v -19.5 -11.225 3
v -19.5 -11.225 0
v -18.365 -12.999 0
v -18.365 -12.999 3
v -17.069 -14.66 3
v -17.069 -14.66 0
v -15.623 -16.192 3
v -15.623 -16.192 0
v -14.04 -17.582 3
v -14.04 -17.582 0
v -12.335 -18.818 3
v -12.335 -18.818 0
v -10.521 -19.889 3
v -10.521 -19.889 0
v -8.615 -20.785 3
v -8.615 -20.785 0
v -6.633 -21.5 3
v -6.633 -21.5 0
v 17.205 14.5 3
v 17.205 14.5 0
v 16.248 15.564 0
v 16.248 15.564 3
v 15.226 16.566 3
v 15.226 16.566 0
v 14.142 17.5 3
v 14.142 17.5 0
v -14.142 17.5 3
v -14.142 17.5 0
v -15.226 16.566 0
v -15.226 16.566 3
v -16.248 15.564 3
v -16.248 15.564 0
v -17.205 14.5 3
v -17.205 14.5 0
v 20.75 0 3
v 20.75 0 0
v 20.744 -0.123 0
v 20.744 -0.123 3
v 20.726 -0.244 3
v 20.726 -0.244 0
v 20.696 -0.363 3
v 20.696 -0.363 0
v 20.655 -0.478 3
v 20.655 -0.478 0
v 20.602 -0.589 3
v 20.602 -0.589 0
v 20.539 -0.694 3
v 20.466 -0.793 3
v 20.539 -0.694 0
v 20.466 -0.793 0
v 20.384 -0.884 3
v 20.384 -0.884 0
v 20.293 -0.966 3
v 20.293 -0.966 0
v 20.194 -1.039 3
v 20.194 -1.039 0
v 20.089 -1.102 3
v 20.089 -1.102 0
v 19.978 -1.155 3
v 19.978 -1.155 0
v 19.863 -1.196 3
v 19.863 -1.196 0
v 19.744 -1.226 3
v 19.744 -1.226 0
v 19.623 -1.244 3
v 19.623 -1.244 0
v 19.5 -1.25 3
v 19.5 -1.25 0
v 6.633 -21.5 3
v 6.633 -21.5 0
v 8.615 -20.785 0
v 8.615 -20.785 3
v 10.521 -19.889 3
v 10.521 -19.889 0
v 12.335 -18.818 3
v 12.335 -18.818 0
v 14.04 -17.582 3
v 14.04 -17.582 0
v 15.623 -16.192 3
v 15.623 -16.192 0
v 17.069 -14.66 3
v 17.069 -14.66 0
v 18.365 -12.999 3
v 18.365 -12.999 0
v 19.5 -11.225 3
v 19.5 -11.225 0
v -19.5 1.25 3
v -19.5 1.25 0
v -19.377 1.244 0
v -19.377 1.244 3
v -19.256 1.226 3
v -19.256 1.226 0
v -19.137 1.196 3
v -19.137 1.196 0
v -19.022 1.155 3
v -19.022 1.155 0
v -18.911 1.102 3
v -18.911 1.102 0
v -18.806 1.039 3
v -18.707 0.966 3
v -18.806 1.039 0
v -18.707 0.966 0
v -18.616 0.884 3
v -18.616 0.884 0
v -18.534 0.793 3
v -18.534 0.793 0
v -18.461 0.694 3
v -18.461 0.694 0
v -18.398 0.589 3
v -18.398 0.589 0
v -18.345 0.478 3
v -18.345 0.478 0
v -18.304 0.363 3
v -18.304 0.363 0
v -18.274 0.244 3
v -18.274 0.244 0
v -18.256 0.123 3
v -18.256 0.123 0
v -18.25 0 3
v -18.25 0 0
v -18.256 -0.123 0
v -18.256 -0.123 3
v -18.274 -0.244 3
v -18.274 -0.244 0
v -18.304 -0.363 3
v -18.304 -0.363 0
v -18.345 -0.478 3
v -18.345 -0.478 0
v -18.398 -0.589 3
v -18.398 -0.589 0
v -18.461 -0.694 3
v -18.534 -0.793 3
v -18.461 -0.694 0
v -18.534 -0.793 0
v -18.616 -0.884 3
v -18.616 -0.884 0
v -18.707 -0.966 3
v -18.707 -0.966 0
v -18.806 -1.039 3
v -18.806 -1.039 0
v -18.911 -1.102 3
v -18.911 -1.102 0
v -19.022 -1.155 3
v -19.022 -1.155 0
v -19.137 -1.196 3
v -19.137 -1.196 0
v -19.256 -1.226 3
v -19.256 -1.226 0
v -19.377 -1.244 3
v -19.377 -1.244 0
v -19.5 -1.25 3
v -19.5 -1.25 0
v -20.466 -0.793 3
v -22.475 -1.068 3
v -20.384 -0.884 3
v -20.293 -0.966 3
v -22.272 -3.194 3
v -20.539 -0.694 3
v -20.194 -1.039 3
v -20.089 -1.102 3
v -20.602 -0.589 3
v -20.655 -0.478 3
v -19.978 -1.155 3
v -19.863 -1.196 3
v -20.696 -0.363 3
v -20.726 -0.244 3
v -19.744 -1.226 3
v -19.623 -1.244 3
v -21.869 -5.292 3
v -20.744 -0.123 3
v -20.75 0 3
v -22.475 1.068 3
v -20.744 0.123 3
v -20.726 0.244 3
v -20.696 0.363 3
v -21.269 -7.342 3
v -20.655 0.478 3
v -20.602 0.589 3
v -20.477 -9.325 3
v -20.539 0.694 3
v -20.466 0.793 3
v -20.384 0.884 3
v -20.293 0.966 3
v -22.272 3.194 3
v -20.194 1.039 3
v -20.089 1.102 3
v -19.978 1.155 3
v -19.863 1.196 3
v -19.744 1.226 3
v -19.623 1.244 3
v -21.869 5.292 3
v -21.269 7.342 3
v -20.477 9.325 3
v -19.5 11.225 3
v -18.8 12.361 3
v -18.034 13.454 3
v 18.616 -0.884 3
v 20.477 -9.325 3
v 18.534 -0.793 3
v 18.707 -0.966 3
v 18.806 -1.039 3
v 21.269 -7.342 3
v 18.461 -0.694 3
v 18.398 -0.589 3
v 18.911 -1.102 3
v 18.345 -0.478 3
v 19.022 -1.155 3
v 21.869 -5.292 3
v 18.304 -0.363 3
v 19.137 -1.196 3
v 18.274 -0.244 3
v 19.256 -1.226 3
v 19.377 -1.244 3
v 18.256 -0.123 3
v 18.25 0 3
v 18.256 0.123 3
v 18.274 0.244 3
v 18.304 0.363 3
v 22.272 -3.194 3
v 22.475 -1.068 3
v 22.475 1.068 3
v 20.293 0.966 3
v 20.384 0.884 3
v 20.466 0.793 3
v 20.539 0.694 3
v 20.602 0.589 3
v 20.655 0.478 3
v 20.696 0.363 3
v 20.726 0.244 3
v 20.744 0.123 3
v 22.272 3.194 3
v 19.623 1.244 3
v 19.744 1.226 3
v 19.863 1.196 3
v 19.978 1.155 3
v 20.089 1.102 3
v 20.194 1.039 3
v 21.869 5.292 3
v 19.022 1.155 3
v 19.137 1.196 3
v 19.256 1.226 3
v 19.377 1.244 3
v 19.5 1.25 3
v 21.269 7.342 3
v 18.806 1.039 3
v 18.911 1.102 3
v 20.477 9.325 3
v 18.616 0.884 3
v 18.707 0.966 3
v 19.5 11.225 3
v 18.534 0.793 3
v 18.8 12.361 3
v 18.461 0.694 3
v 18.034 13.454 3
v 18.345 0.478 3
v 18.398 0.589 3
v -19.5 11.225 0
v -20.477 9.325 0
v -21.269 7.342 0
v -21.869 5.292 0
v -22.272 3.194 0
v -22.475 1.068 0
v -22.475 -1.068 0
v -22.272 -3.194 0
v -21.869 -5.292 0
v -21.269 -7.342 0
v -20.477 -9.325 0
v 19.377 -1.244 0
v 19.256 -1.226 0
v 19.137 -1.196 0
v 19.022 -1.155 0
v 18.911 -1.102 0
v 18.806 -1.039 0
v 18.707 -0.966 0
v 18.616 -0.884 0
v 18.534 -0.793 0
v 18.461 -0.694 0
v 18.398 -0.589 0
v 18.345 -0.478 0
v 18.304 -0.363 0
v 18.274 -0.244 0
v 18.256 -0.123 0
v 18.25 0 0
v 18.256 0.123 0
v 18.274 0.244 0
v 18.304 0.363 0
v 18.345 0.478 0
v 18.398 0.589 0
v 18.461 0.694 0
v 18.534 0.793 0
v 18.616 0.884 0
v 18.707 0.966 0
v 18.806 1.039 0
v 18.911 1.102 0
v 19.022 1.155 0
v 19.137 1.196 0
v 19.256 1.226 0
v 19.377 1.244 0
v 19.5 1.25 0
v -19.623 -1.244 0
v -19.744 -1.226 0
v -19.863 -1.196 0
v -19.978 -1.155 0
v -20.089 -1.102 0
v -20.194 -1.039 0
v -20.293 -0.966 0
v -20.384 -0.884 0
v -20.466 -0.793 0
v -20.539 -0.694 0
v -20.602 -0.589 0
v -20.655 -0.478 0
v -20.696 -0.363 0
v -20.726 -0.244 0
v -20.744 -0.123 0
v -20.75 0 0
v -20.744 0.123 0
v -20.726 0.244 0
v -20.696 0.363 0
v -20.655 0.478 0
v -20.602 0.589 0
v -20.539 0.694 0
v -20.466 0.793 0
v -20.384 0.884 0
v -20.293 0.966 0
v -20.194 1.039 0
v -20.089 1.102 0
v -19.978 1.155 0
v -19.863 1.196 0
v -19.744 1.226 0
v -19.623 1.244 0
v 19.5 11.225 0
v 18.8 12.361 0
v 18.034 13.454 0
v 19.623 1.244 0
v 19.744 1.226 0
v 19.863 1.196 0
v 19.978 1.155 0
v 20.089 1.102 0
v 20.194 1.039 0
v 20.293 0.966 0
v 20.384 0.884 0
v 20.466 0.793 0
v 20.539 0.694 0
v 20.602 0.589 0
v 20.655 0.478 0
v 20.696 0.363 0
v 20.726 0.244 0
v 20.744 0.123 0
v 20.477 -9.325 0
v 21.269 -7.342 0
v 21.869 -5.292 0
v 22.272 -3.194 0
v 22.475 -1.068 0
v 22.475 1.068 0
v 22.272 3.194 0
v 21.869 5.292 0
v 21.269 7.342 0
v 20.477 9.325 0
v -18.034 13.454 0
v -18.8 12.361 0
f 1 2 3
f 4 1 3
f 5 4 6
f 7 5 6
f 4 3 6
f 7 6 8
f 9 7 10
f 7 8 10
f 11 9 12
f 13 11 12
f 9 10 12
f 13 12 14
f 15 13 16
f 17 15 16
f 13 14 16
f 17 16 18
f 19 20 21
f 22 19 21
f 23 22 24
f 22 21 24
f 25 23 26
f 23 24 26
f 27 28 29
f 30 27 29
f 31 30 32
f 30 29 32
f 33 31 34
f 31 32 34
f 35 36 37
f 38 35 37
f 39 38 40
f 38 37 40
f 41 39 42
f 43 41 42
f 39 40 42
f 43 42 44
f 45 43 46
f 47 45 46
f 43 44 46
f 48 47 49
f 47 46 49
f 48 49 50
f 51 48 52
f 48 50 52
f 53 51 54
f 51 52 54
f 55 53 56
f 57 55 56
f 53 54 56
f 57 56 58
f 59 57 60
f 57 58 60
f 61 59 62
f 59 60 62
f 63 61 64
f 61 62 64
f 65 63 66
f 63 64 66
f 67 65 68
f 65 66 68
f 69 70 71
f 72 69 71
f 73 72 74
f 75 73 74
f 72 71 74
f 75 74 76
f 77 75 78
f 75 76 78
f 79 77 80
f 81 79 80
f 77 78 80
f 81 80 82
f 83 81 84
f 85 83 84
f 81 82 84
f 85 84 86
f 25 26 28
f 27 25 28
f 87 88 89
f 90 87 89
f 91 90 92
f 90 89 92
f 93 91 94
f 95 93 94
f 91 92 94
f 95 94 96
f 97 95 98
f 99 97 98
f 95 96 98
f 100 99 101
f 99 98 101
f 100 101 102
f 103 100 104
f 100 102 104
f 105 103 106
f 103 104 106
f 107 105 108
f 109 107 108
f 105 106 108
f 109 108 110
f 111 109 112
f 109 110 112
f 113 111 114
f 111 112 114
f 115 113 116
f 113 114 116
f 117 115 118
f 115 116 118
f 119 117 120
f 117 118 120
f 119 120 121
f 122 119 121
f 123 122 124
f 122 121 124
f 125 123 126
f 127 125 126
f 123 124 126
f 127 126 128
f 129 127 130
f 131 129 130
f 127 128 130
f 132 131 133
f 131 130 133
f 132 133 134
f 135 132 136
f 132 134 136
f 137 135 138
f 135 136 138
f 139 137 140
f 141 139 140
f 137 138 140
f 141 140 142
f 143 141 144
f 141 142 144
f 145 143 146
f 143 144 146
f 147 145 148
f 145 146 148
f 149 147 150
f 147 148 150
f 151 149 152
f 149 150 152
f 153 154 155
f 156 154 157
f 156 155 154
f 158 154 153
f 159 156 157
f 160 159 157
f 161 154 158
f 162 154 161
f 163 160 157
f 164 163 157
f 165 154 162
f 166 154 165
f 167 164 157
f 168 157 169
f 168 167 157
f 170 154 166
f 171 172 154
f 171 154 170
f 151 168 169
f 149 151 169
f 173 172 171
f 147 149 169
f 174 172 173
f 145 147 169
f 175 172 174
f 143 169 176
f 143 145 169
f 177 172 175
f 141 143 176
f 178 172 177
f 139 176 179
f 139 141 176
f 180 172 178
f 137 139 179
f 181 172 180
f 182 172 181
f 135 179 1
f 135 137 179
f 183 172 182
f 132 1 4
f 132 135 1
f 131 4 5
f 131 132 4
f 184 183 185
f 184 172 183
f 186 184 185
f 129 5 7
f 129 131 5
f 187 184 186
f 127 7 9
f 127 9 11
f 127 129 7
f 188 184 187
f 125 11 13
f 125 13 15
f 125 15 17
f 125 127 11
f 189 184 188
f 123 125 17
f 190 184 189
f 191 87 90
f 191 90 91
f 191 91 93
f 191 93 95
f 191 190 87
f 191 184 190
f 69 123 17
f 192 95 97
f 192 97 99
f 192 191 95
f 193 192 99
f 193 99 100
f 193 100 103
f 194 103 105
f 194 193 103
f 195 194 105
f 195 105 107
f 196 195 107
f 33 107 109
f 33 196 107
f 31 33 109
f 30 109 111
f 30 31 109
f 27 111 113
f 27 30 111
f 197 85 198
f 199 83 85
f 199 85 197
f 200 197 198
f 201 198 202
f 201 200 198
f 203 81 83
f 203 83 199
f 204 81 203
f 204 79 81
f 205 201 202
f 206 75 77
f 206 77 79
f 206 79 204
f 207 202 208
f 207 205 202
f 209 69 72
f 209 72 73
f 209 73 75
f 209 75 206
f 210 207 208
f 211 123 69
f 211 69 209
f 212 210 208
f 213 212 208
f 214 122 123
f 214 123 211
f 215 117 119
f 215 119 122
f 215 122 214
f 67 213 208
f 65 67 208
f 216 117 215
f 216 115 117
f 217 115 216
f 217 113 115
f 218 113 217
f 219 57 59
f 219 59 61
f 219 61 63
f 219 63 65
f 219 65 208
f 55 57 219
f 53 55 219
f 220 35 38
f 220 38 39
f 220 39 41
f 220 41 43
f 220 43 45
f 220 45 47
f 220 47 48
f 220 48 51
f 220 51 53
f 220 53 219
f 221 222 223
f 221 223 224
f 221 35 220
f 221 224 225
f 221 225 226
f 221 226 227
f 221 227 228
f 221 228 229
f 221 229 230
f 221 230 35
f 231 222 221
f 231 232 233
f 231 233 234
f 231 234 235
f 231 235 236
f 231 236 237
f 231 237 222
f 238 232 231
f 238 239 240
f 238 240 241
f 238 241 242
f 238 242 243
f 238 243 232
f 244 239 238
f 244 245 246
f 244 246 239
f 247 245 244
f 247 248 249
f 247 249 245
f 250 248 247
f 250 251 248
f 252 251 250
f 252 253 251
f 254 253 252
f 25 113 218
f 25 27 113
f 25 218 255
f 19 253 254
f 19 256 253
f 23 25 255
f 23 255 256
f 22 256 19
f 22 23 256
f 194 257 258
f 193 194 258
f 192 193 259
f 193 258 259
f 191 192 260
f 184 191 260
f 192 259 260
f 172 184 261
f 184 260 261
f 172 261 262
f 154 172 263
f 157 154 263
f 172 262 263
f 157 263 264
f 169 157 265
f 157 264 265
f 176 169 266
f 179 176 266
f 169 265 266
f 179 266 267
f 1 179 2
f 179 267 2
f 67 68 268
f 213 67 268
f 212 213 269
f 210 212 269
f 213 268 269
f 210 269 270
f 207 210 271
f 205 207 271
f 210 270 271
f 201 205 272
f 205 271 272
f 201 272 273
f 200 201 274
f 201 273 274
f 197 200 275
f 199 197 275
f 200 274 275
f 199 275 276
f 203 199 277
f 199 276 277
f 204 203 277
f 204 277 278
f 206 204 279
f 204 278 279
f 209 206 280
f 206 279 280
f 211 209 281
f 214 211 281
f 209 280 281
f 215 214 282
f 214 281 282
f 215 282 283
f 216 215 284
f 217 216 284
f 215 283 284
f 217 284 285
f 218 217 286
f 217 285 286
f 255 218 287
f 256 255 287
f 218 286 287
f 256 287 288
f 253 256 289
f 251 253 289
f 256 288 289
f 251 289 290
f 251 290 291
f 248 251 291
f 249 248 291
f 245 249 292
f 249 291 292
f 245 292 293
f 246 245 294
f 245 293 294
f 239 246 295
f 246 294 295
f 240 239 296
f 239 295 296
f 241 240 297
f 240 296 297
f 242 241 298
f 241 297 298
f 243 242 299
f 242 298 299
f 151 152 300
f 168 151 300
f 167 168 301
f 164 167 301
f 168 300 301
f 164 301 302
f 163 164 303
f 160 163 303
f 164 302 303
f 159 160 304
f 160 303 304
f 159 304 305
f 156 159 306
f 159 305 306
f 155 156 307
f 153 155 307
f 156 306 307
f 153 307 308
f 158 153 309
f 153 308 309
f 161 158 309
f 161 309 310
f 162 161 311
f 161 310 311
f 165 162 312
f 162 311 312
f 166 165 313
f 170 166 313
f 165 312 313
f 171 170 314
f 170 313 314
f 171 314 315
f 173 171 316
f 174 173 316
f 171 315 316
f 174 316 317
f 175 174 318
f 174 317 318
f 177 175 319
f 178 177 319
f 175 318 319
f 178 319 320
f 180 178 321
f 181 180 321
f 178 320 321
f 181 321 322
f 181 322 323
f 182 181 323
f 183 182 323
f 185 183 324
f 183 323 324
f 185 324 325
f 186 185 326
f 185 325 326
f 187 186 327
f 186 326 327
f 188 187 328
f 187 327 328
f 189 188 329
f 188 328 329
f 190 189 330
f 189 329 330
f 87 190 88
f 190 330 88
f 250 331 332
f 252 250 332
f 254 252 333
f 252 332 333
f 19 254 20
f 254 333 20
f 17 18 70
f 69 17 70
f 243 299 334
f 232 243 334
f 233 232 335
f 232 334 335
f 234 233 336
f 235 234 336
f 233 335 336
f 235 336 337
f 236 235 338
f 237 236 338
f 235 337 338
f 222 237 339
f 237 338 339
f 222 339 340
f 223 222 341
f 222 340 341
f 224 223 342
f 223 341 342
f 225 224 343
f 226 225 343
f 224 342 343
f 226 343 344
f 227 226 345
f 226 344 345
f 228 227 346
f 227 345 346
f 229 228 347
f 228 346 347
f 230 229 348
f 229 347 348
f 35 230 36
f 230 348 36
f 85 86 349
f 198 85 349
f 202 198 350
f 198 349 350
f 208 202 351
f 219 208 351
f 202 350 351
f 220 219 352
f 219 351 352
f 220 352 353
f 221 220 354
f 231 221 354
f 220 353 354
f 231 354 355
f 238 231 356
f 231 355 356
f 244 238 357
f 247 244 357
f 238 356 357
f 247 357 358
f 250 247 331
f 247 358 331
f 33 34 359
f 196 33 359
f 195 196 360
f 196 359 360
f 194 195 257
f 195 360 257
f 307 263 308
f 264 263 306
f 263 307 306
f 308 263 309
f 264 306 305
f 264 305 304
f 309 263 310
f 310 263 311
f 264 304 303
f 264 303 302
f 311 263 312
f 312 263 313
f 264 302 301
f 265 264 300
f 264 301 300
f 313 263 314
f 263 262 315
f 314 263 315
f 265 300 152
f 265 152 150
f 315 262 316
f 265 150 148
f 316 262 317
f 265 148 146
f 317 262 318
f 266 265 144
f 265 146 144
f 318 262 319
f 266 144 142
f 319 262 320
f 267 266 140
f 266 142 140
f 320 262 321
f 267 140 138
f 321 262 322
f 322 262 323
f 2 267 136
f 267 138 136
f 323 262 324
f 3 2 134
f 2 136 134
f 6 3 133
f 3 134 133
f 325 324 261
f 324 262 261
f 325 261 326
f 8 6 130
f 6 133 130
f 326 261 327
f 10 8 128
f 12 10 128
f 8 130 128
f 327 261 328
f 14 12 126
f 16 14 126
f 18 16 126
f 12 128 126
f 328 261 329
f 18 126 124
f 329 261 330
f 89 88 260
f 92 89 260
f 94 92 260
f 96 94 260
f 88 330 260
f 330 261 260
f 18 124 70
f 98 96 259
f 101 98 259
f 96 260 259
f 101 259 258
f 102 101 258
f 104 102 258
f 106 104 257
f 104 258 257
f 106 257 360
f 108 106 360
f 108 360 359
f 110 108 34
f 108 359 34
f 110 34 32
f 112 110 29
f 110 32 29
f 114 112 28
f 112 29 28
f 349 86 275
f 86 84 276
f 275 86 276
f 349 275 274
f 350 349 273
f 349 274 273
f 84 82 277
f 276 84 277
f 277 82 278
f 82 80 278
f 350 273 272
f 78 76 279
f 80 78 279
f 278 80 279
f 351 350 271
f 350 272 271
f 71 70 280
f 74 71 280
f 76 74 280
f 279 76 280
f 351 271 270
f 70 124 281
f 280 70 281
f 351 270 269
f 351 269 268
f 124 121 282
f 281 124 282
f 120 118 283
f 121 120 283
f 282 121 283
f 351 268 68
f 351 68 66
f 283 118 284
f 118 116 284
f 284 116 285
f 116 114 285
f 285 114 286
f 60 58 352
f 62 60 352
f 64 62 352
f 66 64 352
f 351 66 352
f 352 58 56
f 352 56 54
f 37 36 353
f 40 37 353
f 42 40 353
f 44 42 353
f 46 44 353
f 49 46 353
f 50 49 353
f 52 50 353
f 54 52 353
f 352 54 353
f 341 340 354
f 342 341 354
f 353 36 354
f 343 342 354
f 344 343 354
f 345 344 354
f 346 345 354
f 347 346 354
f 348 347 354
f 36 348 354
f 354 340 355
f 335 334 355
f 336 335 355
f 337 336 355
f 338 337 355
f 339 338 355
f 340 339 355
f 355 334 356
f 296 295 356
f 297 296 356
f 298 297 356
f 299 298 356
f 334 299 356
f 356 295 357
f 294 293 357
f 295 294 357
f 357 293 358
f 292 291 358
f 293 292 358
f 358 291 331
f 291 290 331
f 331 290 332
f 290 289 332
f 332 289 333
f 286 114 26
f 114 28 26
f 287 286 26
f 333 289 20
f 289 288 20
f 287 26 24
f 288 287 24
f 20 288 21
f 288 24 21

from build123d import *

# Parameters (mm, degrees)
F1_DEPTH = 3


with BuildPart() as f1:
    # F0 (on Top) → F1 (new body)
    with BuildSketch(Plane.XY):
        with BuildLine():
            Line((17.2046505341, 14.5), (-17.2046505341, 14.5))
            ThreePointArc((-17.2046505341, 14.5), (-18.4252352643, 12.9135860804), (-19.5, 11.2249721603))
            Line((-19.5, 11.2249721603), (-19.5, 1.25))
            ThreePointArc((-19.5, 1.25), (-18.6161165235, 0.8838834765), (-18.25, 0))
            ThreePointArc((-18.25, 0), (-18.6161165235, -0.8838834765), (-19.5, -1.25))
            Line((-19.5, -1.25), (-19.5, -11.2249721603))
            ThreePointArc((-19.5, -11.2249721603), (-14.0403252344, -17.5817879441), (-6.6332495807, -21.5))
            Line((-6.6332495807, -21.5), (6.6332495807, -21.5))
            ThreePointArc((6.6332495807, -21.5), (14.0403252344, -17.5817879441), (19.5, -11.2249721603))
            Line((19.5, -11.2249721603), (19.5, -1.25))
            ThreePointArc((19.5, -1.25), (18.25, 0), (19.5, 1.25))
            Line((19.5, 1.25), (19.5, 11.2249721603))
            ThreePointArc((19.5, 11.2249721603), (18.4252352643, 12.9135860804), (17.2046505341, 14.5))
        make_face()
        with BuildLine():
            Line((14.1421356237, 17.5), (-14.1421356237, 17.5))
            ThreePointArc((-14.1421356237, 17.5), (-15.7450071644, 16.0731064015), (-17.2046505341, 14.5))
            Line((-17.2046505341, 14.5), (17.2046505341, 14.5))
            ThreePointArc((17.2046505341, 14.5), (15.7450071644, 16.0731064015), (14.1421356237, 17.5))
        make_face()
        with BuildLine():
            Line((-19.5, 1.25), (-19.5, 11.2249721603))
            ThreePointArc((-19.5, 11.2249721603), (-22.5, 0), (-19.5, -11.2249721603))
            Line((-19.5, -11.2249721603), (-19.5, -1.25))
            ThreePointArc((-19.5, -1.25), (-20.75, 0), (-19.5, 1.25))
        make_face()
        with BuildLine():
            ThreePointArc((19.5, -11.2249721603), (22.5, 0), (19.5, 11.2249721603))
            Line((19.5, 11.2249721603), (19.5, 1.25))
            ThreePointArc((19.5, 1.25), (20.3838834765, 0.8838834765), (20.75, 0))
            ThreePointArc((20.75, 0), (20.3838834765, -0.8838834765), (19.5, -1.25))
            Line((19.5, -1.25), (19.5, -11.2249721603))
        make_face()
    extrude(amount=F1_DEPTH)


solid = f1.part
